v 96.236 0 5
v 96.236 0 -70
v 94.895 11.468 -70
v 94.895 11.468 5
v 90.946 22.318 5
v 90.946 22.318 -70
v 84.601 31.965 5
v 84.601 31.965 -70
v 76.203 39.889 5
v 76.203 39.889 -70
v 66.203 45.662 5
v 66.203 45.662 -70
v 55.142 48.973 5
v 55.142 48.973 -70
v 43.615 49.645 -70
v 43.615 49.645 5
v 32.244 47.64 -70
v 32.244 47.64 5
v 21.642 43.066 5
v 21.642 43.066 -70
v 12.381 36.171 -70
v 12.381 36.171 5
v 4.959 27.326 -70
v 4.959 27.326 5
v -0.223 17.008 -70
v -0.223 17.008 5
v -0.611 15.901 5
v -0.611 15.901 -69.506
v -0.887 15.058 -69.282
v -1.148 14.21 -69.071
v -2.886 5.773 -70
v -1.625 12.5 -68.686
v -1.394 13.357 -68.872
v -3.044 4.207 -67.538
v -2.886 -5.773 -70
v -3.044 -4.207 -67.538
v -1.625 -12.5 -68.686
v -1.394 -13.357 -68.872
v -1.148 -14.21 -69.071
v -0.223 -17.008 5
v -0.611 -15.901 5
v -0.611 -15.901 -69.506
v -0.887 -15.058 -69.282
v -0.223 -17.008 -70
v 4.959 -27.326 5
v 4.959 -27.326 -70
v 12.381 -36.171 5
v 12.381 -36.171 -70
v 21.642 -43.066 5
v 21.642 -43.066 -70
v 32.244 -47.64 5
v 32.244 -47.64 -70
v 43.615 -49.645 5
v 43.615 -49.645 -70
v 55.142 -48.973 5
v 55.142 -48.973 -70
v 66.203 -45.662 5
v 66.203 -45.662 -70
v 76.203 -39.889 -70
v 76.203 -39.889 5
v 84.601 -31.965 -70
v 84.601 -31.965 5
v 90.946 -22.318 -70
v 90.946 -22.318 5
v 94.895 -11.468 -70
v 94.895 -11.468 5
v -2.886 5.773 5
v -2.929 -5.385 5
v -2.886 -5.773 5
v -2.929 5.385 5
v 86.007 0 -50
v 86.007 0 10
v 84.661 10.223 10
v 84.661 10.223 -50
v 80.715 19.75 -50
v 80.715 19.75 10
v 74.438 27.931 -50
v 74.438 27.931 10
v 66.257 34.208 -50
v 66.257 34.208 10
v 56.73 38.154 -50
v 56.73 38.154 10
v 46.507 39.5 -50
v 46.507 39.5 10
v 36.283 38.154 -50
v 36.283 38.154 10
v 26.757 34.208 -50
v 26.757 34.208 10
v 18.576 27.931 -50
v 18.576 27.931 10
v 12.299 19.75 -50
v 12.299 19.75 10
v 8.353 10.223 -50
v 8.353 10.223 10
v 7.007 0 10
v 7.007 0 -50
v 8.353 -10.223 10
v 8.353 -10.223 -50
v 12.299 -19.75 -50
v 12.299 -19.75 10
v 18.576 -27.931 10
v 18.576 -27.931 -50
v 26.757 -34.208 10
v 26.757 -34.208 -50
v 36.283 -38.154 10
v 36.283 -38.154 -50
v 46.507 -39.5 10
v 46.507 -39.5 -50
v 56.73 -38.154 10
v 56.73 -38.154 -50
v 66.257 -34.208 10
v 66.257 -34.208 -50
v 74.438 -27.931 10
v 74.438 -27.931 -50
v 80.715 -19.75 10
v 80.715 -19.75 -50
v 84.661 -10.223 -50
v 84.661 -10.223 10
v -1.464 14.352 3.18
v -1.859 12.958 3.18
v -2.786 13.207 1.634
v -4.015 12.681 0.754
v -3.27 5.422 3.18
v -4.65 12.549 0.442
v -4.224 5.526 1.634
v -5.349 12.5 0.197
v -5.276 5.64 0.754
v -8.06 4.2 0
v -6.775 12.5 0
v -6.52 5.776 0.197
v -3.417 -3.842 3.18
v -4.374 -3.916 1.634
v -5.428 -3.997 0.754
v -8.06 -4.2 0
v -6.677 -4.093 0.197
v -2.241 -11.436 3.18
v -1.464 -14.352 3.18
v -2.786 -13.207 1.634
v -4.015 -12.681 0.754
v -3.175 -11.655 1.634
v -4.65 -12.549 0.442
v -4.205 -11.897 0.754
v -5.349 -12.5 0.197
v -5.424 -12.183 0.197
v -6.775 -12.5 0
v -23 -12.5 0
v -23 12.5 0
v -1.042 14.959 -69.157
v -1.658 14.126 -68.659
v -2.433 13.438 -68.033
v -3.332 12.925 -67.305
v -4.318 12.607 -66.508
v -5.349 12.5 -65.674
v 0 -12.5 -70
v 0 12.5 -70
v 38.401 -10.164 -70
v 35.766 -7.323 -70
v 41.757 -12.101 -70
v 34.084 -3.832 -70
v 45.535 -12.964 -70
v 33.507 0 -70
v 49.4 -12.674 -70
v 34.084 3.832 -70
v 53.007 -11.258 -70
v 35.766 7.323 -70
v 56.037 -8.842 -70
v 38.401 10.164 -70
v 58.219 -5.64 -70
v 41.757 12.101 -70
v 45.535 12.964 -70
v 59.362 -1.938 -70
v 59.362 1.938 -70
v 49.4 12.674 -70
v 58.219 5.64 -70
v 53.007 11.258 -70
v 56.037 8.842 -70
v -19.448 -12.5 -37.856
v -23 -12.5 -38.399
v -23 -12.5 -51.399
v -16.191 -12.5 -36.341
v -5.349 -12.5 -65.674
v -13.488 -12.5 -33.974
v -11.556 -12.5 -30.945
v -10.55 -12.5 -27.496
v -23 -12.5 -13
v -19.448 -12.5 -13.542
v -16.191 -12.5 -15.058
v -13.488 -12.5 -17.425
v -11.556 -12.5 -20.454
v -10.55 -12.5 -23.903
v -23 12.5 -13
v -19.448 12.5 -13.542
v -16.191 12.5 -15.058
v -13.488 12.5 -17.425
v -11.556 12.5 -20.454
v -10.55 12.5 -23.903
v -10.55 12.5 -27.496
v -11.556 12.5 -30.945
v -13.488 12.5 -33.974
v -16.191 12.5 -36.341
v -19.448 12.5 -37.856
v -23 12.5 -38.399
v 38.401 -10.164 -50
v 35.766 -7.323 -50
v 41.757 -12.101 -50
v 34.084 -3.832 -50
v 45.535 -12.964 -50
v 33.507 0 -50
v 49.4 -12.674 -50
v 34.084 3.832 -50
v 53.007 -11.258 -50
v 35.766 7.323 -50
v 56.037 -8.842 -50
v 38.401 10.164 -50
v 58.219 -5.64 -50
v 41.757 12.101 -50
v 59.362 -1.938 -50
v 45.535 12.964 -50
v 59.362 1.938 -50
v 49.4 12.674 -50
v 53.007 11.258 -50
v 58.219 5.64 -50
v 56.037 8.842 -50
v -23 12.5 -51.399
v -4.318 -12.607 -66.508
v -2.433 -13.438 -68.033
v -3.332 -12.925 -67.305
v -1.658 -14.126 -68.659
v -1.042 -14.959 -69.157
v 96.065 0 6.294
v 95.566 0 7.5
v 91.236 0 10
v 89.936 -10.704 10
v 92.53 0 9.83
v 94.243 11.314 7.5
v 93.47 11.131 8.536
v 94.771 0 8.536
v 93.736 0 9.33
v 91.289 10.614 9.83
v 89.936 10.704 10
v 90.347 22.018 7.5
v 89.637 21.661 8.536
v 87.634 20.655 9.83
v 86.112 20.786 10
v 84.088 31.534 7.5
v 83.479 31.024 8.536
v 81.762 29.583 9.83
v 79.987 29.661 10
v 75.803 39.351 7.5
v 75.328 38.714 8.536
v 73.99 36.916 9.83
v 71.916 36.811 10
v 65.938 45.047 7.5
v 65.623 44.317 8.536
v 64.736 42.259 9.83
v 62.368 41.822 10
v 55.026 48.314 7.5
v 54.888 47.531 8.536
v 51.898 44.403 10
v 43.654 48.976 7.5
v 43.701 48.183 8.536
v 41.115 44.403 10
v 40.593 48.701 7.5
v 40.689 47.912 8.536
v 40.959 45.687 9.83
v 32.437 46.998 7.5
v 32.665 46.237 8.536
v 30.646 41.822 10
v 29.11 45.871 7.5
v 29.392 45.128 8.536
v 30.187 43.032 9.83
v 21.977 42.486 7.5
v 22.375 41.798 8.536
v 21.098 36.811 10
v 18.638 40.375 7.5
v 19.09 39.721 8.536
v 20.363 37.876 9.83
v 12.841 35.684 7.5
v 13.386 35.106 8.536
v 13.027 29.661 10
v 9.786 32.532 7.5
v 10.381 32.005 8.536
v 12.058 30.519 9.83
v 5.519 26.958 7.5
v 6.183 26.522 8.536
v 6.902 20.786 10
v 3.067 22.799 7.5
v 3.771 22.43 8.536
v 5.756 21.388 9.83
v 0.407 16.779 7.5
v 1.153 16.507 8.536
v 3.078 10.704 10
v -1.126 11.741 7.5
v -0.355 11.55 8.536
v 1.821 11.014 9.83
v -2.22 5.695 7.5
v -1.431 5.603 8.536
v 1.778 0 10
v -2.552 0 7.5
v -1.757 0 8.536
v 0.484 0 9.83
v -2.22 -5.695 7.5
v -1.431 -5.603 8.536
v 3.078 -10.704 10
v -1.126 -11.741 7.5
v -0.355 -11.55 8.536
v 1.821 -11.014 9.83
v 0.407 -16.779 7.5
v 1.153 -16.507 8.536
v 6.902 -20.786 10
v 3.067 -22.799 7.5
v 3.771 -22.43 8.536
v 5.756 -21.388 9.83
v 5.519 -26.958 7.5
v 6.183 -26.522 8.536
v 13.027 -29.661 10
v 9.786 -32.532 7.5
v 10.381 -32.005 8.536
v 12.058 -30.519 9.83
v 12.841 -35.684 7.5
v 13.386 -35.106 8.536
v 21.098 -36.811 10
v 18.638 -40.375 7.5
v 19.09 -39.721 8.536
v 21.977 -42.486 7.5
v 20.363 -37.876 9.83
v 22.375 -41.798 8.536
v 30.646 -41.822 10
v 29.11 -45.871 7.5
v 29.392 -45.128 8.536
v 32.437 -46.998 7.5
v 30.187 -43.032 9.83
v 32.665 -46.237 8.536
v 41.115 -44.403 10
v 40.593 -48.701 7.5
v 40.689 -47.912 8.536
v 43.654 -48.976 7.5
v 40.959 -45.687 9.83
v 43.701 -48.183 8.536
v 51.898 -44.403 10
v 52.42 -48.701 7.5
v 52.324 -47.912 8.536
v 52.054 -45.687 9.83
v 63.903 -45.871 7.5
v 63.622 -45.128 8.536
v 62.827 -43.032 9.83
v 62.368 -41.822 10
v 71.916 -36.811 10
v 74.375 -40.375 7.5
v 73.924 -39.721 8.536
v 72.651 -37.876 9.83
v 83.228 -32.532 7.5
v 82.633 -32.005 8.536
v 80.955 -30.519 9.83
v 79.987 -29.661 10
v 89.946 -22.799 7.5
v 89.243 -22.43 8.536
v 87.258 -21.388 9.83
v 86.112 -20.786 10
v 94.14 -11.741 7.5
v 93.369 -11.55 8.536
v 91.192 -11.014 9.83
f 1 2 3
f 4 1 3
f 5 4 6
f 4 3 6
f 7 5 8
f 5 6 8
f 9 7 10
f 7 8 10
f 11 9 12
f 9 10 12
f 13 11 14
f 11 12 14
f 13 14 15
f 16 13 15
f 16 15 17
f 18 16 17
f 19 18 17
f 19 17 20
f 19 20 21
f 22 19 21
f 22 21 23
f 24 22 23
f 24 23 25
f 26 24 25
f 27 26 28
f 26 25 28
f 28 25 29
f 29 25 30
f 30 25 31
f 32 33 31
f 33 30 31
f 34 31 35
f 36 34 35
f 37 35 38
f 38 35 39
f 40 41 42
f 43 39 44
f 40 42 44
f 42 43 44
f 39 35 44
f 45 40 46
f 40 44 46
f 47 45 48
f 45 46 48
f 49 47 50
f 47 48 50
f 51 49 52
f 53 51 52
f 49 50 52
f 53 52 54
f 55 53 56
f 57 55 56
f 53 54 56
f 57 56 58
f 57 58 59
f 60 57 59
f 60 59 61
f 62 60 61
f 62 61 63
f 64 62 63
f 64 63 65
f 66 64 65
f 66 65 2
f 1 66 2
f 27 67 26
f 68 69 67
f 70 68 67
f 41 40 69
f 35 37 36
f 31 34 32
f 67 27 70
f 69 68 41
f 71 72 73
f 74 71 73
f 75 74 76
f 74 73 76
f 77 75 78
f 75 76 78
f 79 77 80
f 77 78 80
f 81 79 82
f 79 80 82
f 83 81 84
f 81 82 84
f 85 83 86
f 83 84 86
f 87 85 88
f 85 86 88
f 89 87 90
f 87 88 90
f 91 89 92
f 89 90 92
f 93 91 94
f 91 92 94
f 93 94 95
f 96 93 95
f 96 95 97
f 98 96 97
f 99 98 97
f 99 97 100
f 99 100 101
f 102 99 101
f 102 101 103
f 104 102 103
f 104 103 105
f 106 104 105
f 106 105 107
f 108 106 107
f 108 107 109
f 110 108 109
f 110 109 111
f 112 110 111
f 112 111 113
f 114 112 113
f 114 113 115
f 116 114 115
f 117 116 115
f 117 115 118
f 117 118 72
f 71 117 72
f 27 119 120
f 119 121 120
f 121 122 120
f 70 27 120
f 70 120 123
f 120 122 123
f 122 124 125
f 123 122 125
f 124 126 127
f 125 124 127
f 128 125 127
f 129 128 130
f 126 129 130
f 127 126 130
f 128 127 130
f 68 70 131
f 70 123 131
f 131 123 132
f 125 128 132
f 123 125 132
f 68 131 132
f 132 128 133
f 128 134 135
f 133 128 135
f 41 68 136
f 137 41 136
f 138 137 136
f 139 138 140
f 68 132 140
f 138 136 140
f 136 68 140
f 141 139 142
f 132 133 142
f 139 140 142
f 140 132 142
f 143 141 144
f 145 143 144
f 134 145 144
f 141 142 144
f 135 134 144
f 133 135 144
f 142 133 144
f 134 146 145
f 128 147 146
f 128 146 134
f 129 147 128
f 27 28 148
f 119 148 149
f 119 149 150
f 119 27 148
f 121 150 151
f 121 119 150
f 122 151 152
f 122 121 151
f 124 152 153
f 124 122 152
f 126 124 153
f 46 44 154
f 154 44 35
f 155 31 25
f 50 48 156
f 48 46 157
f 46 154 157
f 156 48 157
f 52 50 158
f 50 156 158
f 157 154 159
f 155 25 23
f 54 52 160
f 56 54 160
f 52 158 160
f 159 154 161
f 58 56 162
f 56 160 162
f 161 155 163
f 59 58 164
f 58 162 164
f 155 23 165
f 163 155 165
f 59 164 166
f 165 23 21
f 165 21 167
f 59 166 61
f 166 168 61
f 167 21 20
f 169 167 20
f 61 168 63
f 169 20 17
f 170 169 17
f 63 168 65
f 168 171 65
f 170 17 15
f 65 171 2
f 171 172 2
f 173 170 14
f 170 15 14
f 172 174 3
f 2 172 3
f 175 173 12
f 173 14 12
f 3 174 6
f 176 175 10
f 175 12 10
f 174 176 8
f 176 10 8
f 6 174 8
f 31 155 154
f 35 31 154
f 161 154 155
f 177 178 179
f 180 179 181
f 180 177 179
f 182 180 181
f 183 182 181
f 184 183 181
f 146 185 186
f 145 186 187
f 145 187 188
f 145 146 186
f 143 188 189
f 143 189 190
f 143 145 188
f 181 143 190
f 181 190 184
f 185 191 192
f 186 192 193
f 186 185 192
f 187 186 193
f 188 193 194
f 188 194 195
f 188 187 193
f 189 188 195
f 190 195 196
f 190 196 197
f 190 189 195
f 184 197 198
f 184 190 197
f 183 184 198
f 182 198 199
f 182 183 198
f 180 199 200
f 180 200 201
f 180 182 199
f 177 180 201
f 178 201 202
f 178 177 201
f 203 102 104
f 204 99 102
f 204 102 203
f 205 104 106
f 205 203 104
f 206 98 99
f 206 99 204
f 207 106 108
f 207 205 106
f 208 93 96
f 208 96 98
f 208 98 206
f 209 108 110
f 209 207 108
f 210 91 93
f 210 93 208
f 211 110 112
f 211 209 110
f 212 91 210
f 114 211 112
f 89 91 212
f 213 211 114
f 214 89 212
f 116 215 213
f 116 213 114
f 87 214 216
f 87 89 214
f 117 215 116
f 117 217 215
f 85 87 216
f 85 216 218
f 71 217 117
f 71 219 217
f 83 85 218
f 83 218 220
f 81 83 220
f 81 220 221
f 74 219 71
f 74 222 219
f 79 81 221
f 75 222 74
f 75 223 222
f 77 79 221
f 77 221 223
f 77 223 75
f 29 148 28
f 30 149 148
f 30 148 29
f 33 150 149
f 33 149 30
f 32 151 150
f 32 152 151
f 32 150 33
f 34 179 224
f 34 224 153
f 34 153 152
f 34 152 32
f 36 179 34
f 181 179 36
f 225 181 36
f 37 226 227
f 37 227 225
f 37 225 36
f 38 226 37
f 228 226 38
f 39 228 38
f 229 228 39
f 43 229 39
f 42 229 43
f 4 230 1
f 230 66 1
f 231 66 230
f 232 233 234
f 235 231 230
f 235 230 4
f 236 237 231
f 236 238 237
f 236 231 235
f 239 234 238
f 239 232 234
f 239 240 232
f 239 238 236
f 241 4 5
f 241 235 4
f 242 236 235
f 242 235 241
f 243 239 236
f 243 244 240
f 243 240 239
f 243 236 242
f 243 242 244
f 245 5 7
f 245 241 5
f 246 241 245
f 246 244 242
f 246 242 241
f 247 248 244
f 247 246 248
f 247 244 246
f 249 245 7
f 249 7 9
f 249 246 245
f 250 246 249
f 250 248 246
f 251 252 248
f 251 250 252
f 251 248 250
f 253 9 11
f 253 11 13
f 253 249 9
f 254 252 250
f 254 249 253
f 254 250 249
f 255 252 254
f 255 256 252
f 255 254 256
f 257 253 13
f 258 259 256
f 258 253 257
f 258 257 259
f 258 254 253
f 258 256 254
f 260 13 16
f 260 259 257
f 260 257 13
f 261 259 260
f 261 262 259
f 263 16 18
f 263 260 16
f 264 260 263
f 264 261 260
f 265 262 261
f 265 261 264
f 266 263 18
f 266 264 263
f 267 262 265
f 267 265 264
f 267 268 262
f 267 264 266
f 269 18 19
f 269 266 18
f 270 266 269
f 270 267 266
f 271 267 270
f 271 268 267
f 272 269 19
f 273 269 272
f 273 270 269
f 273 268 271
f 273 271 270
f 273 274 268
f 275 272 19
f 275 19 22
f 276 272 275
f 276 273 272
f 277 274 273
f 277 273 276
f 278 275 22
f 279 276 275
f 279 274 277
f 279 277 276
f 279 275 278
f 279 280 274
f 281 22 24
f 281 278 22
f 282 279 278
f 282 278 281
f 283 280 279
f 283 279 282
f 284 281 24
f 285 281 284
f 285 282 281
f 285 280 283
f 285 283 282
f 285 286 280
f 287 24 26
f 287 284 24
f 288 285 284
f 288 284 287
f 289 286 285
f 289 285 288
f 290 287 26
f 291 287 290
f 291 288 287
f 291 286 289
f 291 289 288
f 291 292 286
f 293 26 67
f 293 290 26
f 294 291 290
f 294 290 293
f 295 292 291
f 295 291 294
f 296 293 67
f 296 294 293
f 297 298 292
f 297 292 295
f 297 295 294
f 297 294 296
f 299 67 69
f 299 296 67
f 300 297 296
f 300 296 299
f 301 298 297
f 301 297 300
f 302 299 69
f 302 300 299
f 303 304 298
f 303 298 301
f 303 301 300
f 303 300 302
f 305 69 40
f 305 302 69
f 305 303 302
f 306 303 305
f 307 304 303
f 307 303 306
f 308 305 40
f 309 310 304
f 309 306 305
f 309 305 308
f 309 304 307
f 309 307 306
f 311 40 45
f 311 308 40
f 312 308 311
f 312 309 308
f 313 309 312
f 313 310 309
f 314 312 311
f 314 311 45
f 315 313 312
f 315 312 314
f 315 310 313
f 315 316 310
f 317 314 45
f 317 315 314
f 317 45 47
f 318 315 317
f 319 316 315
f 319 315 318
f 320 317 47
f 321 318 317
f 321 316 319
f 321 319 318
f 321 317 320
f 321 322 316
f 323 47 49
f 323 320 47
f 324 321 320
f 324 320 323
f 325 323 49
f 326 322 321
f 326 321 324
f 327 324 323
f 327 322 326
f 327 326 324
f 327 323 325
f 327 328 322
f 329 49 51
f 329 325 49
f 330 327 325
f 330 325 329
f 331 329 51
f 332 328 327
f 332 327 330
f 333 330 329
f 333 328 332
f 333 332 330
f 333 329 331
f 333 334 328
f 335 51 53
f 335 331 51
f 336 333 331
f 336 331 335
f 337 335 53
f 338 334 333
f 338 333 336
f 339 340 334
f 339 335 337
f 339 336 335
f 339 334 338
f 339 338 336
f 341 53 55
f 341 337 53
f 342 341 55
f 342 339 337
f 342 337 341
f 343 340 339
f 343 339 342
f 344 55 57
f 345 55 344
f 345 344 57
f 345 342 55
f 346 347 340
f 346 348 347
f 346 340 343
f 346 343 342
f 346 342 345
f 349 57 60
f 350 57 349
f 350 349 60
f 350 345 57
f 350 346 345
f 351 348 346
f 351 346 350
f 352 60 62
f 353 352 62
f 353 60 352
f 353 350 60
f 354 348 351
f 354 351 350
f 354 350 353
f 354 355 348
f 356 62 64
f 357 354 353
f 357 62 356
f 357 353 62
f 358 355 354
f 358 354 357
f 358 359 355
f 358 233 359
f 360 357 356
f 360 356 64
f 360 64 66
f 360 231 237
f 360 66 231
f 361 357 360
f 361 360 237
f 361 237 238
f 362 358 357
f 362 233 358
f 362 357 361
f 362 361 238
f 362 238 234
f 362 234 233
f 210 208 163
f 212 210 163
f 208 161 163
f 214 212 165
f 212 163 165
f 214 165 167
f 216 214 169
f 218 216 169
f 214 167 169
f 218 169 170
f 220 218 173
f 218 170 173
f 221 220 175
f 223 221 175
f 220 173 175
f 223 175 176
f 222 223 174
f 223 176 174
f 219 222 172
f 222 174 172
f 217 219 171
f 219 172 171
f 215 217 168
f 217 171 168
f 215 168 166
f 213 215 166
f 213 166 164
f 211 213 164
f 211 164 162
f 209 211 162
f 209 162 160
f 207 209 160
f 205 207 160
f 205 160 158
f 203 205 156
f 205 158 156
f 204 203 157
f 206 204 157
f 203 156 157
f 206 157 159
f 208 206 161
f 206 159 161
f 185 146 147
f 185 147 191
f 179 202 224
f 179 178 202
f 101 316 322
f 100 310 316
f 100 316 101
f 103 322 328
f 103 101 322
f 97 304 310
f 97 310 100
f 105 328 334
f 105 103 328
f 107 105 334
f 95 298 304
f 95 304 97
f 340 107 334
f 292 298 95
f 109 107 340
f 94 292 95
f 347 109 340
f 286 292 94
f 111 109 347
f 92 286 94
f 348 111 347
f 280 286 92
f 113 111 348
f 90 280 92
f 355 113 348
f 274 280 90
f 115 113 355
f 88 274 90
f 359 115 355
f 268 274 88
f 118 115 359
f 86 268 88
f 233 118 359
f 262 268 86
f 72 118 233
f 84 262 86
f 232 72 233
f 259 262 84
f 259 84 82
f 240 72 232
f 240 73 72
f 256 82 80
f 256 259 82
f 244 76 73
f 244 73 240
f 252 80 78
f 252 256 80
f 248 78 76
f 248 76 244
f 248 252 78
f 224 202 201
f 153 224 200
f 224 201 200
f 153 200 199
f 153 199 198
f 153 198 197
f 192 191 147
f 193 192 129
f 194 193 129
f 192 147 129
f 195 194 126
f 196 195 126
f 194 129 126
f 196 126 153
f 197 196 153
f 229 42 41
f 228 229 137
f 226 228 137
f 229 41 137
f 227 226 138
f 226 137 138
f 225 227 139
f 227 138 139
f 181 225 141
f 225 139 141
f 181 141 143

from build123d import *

# Parameters (mm, degrees)
F1_DEPTH       = 12.5
F2_R           = 49.7287092038
F3_DEPTH       = 70
F5_DEPTH       = 10
F8_D           = 26
F8_CBORE_D     = 79
F8_CBORE_DEPTH = 60
F9_R           = 5
F10_R          = 4.99999


# Not quite as in the source:
# - a fillet or chamfer is up to 0.001 mm smaller than in the source, because OpenCascade refuses the exact size
# - a feature names something its author has since deleted; it is built from what else it names


with BuildPart() as f1:
    # F0 (on Front) → F1 (new body, symmetric)
    with BuildSketch(Plane.XZ):
        with BuildLine():
            Line((0, -70), (0, 0))
            Line((0, 0), (-23, 0))
            Line((-23, 0), (-23, -13))
            ThreePointArc((-23, -13), (-10.4224046937, -25.699410108), (-23, -38.398820216))
            Line((-23, -38.398820216), (-23, -51.398820216))
            Line((-23, -51.398820216), (0, -70))
        make_face()
    extrude(amount=F1_DEPTH, both=True)

    # F2 (on Top) → F3 (join)
    with BuildSketch(Plane.XY):
        with Locations((46.5068519115, 0)):
            Circle(F2_R)
    extrude(amount=-F3_DEPTH)

    # F2 (on Top) → F5 (join)
    with BuildSketch(Plane.XY):
        with Locations((46.5068519115, 0)):
            Circle(F2_R)
    extrude(amount=F5_DEPTH)

    # F8 (through all)
    with Locations(Plane.XY.offset(10)):
        with Locations((46.5068519115, 0)):
            CounterBoreHole(F8_D / 2, F8_CBORE_D / 2, F8_CBORE_DEPTH)

    # F9
    f9_edges = [f1.edges().sort_by_distance(p)[0] for p in [
        (-3.221857, 0, 10),
    ]]
    fillet(f9_edges, radius=F9_R)

    # F10 (radius 5 in the source; OpenCascade refuses exactly that, so slightly less here)
    f10_edges = [f1.edges().sort_by_distance(p)[0] for p in [
        (-1.625201, 12.5, -34.342812),
        (-1.625201, -12.5, -34.342812),
        (-3.221857, 0, 0),
    ]]
    fillet(f10_edges, radius=F10_R)


solid = f1.part
